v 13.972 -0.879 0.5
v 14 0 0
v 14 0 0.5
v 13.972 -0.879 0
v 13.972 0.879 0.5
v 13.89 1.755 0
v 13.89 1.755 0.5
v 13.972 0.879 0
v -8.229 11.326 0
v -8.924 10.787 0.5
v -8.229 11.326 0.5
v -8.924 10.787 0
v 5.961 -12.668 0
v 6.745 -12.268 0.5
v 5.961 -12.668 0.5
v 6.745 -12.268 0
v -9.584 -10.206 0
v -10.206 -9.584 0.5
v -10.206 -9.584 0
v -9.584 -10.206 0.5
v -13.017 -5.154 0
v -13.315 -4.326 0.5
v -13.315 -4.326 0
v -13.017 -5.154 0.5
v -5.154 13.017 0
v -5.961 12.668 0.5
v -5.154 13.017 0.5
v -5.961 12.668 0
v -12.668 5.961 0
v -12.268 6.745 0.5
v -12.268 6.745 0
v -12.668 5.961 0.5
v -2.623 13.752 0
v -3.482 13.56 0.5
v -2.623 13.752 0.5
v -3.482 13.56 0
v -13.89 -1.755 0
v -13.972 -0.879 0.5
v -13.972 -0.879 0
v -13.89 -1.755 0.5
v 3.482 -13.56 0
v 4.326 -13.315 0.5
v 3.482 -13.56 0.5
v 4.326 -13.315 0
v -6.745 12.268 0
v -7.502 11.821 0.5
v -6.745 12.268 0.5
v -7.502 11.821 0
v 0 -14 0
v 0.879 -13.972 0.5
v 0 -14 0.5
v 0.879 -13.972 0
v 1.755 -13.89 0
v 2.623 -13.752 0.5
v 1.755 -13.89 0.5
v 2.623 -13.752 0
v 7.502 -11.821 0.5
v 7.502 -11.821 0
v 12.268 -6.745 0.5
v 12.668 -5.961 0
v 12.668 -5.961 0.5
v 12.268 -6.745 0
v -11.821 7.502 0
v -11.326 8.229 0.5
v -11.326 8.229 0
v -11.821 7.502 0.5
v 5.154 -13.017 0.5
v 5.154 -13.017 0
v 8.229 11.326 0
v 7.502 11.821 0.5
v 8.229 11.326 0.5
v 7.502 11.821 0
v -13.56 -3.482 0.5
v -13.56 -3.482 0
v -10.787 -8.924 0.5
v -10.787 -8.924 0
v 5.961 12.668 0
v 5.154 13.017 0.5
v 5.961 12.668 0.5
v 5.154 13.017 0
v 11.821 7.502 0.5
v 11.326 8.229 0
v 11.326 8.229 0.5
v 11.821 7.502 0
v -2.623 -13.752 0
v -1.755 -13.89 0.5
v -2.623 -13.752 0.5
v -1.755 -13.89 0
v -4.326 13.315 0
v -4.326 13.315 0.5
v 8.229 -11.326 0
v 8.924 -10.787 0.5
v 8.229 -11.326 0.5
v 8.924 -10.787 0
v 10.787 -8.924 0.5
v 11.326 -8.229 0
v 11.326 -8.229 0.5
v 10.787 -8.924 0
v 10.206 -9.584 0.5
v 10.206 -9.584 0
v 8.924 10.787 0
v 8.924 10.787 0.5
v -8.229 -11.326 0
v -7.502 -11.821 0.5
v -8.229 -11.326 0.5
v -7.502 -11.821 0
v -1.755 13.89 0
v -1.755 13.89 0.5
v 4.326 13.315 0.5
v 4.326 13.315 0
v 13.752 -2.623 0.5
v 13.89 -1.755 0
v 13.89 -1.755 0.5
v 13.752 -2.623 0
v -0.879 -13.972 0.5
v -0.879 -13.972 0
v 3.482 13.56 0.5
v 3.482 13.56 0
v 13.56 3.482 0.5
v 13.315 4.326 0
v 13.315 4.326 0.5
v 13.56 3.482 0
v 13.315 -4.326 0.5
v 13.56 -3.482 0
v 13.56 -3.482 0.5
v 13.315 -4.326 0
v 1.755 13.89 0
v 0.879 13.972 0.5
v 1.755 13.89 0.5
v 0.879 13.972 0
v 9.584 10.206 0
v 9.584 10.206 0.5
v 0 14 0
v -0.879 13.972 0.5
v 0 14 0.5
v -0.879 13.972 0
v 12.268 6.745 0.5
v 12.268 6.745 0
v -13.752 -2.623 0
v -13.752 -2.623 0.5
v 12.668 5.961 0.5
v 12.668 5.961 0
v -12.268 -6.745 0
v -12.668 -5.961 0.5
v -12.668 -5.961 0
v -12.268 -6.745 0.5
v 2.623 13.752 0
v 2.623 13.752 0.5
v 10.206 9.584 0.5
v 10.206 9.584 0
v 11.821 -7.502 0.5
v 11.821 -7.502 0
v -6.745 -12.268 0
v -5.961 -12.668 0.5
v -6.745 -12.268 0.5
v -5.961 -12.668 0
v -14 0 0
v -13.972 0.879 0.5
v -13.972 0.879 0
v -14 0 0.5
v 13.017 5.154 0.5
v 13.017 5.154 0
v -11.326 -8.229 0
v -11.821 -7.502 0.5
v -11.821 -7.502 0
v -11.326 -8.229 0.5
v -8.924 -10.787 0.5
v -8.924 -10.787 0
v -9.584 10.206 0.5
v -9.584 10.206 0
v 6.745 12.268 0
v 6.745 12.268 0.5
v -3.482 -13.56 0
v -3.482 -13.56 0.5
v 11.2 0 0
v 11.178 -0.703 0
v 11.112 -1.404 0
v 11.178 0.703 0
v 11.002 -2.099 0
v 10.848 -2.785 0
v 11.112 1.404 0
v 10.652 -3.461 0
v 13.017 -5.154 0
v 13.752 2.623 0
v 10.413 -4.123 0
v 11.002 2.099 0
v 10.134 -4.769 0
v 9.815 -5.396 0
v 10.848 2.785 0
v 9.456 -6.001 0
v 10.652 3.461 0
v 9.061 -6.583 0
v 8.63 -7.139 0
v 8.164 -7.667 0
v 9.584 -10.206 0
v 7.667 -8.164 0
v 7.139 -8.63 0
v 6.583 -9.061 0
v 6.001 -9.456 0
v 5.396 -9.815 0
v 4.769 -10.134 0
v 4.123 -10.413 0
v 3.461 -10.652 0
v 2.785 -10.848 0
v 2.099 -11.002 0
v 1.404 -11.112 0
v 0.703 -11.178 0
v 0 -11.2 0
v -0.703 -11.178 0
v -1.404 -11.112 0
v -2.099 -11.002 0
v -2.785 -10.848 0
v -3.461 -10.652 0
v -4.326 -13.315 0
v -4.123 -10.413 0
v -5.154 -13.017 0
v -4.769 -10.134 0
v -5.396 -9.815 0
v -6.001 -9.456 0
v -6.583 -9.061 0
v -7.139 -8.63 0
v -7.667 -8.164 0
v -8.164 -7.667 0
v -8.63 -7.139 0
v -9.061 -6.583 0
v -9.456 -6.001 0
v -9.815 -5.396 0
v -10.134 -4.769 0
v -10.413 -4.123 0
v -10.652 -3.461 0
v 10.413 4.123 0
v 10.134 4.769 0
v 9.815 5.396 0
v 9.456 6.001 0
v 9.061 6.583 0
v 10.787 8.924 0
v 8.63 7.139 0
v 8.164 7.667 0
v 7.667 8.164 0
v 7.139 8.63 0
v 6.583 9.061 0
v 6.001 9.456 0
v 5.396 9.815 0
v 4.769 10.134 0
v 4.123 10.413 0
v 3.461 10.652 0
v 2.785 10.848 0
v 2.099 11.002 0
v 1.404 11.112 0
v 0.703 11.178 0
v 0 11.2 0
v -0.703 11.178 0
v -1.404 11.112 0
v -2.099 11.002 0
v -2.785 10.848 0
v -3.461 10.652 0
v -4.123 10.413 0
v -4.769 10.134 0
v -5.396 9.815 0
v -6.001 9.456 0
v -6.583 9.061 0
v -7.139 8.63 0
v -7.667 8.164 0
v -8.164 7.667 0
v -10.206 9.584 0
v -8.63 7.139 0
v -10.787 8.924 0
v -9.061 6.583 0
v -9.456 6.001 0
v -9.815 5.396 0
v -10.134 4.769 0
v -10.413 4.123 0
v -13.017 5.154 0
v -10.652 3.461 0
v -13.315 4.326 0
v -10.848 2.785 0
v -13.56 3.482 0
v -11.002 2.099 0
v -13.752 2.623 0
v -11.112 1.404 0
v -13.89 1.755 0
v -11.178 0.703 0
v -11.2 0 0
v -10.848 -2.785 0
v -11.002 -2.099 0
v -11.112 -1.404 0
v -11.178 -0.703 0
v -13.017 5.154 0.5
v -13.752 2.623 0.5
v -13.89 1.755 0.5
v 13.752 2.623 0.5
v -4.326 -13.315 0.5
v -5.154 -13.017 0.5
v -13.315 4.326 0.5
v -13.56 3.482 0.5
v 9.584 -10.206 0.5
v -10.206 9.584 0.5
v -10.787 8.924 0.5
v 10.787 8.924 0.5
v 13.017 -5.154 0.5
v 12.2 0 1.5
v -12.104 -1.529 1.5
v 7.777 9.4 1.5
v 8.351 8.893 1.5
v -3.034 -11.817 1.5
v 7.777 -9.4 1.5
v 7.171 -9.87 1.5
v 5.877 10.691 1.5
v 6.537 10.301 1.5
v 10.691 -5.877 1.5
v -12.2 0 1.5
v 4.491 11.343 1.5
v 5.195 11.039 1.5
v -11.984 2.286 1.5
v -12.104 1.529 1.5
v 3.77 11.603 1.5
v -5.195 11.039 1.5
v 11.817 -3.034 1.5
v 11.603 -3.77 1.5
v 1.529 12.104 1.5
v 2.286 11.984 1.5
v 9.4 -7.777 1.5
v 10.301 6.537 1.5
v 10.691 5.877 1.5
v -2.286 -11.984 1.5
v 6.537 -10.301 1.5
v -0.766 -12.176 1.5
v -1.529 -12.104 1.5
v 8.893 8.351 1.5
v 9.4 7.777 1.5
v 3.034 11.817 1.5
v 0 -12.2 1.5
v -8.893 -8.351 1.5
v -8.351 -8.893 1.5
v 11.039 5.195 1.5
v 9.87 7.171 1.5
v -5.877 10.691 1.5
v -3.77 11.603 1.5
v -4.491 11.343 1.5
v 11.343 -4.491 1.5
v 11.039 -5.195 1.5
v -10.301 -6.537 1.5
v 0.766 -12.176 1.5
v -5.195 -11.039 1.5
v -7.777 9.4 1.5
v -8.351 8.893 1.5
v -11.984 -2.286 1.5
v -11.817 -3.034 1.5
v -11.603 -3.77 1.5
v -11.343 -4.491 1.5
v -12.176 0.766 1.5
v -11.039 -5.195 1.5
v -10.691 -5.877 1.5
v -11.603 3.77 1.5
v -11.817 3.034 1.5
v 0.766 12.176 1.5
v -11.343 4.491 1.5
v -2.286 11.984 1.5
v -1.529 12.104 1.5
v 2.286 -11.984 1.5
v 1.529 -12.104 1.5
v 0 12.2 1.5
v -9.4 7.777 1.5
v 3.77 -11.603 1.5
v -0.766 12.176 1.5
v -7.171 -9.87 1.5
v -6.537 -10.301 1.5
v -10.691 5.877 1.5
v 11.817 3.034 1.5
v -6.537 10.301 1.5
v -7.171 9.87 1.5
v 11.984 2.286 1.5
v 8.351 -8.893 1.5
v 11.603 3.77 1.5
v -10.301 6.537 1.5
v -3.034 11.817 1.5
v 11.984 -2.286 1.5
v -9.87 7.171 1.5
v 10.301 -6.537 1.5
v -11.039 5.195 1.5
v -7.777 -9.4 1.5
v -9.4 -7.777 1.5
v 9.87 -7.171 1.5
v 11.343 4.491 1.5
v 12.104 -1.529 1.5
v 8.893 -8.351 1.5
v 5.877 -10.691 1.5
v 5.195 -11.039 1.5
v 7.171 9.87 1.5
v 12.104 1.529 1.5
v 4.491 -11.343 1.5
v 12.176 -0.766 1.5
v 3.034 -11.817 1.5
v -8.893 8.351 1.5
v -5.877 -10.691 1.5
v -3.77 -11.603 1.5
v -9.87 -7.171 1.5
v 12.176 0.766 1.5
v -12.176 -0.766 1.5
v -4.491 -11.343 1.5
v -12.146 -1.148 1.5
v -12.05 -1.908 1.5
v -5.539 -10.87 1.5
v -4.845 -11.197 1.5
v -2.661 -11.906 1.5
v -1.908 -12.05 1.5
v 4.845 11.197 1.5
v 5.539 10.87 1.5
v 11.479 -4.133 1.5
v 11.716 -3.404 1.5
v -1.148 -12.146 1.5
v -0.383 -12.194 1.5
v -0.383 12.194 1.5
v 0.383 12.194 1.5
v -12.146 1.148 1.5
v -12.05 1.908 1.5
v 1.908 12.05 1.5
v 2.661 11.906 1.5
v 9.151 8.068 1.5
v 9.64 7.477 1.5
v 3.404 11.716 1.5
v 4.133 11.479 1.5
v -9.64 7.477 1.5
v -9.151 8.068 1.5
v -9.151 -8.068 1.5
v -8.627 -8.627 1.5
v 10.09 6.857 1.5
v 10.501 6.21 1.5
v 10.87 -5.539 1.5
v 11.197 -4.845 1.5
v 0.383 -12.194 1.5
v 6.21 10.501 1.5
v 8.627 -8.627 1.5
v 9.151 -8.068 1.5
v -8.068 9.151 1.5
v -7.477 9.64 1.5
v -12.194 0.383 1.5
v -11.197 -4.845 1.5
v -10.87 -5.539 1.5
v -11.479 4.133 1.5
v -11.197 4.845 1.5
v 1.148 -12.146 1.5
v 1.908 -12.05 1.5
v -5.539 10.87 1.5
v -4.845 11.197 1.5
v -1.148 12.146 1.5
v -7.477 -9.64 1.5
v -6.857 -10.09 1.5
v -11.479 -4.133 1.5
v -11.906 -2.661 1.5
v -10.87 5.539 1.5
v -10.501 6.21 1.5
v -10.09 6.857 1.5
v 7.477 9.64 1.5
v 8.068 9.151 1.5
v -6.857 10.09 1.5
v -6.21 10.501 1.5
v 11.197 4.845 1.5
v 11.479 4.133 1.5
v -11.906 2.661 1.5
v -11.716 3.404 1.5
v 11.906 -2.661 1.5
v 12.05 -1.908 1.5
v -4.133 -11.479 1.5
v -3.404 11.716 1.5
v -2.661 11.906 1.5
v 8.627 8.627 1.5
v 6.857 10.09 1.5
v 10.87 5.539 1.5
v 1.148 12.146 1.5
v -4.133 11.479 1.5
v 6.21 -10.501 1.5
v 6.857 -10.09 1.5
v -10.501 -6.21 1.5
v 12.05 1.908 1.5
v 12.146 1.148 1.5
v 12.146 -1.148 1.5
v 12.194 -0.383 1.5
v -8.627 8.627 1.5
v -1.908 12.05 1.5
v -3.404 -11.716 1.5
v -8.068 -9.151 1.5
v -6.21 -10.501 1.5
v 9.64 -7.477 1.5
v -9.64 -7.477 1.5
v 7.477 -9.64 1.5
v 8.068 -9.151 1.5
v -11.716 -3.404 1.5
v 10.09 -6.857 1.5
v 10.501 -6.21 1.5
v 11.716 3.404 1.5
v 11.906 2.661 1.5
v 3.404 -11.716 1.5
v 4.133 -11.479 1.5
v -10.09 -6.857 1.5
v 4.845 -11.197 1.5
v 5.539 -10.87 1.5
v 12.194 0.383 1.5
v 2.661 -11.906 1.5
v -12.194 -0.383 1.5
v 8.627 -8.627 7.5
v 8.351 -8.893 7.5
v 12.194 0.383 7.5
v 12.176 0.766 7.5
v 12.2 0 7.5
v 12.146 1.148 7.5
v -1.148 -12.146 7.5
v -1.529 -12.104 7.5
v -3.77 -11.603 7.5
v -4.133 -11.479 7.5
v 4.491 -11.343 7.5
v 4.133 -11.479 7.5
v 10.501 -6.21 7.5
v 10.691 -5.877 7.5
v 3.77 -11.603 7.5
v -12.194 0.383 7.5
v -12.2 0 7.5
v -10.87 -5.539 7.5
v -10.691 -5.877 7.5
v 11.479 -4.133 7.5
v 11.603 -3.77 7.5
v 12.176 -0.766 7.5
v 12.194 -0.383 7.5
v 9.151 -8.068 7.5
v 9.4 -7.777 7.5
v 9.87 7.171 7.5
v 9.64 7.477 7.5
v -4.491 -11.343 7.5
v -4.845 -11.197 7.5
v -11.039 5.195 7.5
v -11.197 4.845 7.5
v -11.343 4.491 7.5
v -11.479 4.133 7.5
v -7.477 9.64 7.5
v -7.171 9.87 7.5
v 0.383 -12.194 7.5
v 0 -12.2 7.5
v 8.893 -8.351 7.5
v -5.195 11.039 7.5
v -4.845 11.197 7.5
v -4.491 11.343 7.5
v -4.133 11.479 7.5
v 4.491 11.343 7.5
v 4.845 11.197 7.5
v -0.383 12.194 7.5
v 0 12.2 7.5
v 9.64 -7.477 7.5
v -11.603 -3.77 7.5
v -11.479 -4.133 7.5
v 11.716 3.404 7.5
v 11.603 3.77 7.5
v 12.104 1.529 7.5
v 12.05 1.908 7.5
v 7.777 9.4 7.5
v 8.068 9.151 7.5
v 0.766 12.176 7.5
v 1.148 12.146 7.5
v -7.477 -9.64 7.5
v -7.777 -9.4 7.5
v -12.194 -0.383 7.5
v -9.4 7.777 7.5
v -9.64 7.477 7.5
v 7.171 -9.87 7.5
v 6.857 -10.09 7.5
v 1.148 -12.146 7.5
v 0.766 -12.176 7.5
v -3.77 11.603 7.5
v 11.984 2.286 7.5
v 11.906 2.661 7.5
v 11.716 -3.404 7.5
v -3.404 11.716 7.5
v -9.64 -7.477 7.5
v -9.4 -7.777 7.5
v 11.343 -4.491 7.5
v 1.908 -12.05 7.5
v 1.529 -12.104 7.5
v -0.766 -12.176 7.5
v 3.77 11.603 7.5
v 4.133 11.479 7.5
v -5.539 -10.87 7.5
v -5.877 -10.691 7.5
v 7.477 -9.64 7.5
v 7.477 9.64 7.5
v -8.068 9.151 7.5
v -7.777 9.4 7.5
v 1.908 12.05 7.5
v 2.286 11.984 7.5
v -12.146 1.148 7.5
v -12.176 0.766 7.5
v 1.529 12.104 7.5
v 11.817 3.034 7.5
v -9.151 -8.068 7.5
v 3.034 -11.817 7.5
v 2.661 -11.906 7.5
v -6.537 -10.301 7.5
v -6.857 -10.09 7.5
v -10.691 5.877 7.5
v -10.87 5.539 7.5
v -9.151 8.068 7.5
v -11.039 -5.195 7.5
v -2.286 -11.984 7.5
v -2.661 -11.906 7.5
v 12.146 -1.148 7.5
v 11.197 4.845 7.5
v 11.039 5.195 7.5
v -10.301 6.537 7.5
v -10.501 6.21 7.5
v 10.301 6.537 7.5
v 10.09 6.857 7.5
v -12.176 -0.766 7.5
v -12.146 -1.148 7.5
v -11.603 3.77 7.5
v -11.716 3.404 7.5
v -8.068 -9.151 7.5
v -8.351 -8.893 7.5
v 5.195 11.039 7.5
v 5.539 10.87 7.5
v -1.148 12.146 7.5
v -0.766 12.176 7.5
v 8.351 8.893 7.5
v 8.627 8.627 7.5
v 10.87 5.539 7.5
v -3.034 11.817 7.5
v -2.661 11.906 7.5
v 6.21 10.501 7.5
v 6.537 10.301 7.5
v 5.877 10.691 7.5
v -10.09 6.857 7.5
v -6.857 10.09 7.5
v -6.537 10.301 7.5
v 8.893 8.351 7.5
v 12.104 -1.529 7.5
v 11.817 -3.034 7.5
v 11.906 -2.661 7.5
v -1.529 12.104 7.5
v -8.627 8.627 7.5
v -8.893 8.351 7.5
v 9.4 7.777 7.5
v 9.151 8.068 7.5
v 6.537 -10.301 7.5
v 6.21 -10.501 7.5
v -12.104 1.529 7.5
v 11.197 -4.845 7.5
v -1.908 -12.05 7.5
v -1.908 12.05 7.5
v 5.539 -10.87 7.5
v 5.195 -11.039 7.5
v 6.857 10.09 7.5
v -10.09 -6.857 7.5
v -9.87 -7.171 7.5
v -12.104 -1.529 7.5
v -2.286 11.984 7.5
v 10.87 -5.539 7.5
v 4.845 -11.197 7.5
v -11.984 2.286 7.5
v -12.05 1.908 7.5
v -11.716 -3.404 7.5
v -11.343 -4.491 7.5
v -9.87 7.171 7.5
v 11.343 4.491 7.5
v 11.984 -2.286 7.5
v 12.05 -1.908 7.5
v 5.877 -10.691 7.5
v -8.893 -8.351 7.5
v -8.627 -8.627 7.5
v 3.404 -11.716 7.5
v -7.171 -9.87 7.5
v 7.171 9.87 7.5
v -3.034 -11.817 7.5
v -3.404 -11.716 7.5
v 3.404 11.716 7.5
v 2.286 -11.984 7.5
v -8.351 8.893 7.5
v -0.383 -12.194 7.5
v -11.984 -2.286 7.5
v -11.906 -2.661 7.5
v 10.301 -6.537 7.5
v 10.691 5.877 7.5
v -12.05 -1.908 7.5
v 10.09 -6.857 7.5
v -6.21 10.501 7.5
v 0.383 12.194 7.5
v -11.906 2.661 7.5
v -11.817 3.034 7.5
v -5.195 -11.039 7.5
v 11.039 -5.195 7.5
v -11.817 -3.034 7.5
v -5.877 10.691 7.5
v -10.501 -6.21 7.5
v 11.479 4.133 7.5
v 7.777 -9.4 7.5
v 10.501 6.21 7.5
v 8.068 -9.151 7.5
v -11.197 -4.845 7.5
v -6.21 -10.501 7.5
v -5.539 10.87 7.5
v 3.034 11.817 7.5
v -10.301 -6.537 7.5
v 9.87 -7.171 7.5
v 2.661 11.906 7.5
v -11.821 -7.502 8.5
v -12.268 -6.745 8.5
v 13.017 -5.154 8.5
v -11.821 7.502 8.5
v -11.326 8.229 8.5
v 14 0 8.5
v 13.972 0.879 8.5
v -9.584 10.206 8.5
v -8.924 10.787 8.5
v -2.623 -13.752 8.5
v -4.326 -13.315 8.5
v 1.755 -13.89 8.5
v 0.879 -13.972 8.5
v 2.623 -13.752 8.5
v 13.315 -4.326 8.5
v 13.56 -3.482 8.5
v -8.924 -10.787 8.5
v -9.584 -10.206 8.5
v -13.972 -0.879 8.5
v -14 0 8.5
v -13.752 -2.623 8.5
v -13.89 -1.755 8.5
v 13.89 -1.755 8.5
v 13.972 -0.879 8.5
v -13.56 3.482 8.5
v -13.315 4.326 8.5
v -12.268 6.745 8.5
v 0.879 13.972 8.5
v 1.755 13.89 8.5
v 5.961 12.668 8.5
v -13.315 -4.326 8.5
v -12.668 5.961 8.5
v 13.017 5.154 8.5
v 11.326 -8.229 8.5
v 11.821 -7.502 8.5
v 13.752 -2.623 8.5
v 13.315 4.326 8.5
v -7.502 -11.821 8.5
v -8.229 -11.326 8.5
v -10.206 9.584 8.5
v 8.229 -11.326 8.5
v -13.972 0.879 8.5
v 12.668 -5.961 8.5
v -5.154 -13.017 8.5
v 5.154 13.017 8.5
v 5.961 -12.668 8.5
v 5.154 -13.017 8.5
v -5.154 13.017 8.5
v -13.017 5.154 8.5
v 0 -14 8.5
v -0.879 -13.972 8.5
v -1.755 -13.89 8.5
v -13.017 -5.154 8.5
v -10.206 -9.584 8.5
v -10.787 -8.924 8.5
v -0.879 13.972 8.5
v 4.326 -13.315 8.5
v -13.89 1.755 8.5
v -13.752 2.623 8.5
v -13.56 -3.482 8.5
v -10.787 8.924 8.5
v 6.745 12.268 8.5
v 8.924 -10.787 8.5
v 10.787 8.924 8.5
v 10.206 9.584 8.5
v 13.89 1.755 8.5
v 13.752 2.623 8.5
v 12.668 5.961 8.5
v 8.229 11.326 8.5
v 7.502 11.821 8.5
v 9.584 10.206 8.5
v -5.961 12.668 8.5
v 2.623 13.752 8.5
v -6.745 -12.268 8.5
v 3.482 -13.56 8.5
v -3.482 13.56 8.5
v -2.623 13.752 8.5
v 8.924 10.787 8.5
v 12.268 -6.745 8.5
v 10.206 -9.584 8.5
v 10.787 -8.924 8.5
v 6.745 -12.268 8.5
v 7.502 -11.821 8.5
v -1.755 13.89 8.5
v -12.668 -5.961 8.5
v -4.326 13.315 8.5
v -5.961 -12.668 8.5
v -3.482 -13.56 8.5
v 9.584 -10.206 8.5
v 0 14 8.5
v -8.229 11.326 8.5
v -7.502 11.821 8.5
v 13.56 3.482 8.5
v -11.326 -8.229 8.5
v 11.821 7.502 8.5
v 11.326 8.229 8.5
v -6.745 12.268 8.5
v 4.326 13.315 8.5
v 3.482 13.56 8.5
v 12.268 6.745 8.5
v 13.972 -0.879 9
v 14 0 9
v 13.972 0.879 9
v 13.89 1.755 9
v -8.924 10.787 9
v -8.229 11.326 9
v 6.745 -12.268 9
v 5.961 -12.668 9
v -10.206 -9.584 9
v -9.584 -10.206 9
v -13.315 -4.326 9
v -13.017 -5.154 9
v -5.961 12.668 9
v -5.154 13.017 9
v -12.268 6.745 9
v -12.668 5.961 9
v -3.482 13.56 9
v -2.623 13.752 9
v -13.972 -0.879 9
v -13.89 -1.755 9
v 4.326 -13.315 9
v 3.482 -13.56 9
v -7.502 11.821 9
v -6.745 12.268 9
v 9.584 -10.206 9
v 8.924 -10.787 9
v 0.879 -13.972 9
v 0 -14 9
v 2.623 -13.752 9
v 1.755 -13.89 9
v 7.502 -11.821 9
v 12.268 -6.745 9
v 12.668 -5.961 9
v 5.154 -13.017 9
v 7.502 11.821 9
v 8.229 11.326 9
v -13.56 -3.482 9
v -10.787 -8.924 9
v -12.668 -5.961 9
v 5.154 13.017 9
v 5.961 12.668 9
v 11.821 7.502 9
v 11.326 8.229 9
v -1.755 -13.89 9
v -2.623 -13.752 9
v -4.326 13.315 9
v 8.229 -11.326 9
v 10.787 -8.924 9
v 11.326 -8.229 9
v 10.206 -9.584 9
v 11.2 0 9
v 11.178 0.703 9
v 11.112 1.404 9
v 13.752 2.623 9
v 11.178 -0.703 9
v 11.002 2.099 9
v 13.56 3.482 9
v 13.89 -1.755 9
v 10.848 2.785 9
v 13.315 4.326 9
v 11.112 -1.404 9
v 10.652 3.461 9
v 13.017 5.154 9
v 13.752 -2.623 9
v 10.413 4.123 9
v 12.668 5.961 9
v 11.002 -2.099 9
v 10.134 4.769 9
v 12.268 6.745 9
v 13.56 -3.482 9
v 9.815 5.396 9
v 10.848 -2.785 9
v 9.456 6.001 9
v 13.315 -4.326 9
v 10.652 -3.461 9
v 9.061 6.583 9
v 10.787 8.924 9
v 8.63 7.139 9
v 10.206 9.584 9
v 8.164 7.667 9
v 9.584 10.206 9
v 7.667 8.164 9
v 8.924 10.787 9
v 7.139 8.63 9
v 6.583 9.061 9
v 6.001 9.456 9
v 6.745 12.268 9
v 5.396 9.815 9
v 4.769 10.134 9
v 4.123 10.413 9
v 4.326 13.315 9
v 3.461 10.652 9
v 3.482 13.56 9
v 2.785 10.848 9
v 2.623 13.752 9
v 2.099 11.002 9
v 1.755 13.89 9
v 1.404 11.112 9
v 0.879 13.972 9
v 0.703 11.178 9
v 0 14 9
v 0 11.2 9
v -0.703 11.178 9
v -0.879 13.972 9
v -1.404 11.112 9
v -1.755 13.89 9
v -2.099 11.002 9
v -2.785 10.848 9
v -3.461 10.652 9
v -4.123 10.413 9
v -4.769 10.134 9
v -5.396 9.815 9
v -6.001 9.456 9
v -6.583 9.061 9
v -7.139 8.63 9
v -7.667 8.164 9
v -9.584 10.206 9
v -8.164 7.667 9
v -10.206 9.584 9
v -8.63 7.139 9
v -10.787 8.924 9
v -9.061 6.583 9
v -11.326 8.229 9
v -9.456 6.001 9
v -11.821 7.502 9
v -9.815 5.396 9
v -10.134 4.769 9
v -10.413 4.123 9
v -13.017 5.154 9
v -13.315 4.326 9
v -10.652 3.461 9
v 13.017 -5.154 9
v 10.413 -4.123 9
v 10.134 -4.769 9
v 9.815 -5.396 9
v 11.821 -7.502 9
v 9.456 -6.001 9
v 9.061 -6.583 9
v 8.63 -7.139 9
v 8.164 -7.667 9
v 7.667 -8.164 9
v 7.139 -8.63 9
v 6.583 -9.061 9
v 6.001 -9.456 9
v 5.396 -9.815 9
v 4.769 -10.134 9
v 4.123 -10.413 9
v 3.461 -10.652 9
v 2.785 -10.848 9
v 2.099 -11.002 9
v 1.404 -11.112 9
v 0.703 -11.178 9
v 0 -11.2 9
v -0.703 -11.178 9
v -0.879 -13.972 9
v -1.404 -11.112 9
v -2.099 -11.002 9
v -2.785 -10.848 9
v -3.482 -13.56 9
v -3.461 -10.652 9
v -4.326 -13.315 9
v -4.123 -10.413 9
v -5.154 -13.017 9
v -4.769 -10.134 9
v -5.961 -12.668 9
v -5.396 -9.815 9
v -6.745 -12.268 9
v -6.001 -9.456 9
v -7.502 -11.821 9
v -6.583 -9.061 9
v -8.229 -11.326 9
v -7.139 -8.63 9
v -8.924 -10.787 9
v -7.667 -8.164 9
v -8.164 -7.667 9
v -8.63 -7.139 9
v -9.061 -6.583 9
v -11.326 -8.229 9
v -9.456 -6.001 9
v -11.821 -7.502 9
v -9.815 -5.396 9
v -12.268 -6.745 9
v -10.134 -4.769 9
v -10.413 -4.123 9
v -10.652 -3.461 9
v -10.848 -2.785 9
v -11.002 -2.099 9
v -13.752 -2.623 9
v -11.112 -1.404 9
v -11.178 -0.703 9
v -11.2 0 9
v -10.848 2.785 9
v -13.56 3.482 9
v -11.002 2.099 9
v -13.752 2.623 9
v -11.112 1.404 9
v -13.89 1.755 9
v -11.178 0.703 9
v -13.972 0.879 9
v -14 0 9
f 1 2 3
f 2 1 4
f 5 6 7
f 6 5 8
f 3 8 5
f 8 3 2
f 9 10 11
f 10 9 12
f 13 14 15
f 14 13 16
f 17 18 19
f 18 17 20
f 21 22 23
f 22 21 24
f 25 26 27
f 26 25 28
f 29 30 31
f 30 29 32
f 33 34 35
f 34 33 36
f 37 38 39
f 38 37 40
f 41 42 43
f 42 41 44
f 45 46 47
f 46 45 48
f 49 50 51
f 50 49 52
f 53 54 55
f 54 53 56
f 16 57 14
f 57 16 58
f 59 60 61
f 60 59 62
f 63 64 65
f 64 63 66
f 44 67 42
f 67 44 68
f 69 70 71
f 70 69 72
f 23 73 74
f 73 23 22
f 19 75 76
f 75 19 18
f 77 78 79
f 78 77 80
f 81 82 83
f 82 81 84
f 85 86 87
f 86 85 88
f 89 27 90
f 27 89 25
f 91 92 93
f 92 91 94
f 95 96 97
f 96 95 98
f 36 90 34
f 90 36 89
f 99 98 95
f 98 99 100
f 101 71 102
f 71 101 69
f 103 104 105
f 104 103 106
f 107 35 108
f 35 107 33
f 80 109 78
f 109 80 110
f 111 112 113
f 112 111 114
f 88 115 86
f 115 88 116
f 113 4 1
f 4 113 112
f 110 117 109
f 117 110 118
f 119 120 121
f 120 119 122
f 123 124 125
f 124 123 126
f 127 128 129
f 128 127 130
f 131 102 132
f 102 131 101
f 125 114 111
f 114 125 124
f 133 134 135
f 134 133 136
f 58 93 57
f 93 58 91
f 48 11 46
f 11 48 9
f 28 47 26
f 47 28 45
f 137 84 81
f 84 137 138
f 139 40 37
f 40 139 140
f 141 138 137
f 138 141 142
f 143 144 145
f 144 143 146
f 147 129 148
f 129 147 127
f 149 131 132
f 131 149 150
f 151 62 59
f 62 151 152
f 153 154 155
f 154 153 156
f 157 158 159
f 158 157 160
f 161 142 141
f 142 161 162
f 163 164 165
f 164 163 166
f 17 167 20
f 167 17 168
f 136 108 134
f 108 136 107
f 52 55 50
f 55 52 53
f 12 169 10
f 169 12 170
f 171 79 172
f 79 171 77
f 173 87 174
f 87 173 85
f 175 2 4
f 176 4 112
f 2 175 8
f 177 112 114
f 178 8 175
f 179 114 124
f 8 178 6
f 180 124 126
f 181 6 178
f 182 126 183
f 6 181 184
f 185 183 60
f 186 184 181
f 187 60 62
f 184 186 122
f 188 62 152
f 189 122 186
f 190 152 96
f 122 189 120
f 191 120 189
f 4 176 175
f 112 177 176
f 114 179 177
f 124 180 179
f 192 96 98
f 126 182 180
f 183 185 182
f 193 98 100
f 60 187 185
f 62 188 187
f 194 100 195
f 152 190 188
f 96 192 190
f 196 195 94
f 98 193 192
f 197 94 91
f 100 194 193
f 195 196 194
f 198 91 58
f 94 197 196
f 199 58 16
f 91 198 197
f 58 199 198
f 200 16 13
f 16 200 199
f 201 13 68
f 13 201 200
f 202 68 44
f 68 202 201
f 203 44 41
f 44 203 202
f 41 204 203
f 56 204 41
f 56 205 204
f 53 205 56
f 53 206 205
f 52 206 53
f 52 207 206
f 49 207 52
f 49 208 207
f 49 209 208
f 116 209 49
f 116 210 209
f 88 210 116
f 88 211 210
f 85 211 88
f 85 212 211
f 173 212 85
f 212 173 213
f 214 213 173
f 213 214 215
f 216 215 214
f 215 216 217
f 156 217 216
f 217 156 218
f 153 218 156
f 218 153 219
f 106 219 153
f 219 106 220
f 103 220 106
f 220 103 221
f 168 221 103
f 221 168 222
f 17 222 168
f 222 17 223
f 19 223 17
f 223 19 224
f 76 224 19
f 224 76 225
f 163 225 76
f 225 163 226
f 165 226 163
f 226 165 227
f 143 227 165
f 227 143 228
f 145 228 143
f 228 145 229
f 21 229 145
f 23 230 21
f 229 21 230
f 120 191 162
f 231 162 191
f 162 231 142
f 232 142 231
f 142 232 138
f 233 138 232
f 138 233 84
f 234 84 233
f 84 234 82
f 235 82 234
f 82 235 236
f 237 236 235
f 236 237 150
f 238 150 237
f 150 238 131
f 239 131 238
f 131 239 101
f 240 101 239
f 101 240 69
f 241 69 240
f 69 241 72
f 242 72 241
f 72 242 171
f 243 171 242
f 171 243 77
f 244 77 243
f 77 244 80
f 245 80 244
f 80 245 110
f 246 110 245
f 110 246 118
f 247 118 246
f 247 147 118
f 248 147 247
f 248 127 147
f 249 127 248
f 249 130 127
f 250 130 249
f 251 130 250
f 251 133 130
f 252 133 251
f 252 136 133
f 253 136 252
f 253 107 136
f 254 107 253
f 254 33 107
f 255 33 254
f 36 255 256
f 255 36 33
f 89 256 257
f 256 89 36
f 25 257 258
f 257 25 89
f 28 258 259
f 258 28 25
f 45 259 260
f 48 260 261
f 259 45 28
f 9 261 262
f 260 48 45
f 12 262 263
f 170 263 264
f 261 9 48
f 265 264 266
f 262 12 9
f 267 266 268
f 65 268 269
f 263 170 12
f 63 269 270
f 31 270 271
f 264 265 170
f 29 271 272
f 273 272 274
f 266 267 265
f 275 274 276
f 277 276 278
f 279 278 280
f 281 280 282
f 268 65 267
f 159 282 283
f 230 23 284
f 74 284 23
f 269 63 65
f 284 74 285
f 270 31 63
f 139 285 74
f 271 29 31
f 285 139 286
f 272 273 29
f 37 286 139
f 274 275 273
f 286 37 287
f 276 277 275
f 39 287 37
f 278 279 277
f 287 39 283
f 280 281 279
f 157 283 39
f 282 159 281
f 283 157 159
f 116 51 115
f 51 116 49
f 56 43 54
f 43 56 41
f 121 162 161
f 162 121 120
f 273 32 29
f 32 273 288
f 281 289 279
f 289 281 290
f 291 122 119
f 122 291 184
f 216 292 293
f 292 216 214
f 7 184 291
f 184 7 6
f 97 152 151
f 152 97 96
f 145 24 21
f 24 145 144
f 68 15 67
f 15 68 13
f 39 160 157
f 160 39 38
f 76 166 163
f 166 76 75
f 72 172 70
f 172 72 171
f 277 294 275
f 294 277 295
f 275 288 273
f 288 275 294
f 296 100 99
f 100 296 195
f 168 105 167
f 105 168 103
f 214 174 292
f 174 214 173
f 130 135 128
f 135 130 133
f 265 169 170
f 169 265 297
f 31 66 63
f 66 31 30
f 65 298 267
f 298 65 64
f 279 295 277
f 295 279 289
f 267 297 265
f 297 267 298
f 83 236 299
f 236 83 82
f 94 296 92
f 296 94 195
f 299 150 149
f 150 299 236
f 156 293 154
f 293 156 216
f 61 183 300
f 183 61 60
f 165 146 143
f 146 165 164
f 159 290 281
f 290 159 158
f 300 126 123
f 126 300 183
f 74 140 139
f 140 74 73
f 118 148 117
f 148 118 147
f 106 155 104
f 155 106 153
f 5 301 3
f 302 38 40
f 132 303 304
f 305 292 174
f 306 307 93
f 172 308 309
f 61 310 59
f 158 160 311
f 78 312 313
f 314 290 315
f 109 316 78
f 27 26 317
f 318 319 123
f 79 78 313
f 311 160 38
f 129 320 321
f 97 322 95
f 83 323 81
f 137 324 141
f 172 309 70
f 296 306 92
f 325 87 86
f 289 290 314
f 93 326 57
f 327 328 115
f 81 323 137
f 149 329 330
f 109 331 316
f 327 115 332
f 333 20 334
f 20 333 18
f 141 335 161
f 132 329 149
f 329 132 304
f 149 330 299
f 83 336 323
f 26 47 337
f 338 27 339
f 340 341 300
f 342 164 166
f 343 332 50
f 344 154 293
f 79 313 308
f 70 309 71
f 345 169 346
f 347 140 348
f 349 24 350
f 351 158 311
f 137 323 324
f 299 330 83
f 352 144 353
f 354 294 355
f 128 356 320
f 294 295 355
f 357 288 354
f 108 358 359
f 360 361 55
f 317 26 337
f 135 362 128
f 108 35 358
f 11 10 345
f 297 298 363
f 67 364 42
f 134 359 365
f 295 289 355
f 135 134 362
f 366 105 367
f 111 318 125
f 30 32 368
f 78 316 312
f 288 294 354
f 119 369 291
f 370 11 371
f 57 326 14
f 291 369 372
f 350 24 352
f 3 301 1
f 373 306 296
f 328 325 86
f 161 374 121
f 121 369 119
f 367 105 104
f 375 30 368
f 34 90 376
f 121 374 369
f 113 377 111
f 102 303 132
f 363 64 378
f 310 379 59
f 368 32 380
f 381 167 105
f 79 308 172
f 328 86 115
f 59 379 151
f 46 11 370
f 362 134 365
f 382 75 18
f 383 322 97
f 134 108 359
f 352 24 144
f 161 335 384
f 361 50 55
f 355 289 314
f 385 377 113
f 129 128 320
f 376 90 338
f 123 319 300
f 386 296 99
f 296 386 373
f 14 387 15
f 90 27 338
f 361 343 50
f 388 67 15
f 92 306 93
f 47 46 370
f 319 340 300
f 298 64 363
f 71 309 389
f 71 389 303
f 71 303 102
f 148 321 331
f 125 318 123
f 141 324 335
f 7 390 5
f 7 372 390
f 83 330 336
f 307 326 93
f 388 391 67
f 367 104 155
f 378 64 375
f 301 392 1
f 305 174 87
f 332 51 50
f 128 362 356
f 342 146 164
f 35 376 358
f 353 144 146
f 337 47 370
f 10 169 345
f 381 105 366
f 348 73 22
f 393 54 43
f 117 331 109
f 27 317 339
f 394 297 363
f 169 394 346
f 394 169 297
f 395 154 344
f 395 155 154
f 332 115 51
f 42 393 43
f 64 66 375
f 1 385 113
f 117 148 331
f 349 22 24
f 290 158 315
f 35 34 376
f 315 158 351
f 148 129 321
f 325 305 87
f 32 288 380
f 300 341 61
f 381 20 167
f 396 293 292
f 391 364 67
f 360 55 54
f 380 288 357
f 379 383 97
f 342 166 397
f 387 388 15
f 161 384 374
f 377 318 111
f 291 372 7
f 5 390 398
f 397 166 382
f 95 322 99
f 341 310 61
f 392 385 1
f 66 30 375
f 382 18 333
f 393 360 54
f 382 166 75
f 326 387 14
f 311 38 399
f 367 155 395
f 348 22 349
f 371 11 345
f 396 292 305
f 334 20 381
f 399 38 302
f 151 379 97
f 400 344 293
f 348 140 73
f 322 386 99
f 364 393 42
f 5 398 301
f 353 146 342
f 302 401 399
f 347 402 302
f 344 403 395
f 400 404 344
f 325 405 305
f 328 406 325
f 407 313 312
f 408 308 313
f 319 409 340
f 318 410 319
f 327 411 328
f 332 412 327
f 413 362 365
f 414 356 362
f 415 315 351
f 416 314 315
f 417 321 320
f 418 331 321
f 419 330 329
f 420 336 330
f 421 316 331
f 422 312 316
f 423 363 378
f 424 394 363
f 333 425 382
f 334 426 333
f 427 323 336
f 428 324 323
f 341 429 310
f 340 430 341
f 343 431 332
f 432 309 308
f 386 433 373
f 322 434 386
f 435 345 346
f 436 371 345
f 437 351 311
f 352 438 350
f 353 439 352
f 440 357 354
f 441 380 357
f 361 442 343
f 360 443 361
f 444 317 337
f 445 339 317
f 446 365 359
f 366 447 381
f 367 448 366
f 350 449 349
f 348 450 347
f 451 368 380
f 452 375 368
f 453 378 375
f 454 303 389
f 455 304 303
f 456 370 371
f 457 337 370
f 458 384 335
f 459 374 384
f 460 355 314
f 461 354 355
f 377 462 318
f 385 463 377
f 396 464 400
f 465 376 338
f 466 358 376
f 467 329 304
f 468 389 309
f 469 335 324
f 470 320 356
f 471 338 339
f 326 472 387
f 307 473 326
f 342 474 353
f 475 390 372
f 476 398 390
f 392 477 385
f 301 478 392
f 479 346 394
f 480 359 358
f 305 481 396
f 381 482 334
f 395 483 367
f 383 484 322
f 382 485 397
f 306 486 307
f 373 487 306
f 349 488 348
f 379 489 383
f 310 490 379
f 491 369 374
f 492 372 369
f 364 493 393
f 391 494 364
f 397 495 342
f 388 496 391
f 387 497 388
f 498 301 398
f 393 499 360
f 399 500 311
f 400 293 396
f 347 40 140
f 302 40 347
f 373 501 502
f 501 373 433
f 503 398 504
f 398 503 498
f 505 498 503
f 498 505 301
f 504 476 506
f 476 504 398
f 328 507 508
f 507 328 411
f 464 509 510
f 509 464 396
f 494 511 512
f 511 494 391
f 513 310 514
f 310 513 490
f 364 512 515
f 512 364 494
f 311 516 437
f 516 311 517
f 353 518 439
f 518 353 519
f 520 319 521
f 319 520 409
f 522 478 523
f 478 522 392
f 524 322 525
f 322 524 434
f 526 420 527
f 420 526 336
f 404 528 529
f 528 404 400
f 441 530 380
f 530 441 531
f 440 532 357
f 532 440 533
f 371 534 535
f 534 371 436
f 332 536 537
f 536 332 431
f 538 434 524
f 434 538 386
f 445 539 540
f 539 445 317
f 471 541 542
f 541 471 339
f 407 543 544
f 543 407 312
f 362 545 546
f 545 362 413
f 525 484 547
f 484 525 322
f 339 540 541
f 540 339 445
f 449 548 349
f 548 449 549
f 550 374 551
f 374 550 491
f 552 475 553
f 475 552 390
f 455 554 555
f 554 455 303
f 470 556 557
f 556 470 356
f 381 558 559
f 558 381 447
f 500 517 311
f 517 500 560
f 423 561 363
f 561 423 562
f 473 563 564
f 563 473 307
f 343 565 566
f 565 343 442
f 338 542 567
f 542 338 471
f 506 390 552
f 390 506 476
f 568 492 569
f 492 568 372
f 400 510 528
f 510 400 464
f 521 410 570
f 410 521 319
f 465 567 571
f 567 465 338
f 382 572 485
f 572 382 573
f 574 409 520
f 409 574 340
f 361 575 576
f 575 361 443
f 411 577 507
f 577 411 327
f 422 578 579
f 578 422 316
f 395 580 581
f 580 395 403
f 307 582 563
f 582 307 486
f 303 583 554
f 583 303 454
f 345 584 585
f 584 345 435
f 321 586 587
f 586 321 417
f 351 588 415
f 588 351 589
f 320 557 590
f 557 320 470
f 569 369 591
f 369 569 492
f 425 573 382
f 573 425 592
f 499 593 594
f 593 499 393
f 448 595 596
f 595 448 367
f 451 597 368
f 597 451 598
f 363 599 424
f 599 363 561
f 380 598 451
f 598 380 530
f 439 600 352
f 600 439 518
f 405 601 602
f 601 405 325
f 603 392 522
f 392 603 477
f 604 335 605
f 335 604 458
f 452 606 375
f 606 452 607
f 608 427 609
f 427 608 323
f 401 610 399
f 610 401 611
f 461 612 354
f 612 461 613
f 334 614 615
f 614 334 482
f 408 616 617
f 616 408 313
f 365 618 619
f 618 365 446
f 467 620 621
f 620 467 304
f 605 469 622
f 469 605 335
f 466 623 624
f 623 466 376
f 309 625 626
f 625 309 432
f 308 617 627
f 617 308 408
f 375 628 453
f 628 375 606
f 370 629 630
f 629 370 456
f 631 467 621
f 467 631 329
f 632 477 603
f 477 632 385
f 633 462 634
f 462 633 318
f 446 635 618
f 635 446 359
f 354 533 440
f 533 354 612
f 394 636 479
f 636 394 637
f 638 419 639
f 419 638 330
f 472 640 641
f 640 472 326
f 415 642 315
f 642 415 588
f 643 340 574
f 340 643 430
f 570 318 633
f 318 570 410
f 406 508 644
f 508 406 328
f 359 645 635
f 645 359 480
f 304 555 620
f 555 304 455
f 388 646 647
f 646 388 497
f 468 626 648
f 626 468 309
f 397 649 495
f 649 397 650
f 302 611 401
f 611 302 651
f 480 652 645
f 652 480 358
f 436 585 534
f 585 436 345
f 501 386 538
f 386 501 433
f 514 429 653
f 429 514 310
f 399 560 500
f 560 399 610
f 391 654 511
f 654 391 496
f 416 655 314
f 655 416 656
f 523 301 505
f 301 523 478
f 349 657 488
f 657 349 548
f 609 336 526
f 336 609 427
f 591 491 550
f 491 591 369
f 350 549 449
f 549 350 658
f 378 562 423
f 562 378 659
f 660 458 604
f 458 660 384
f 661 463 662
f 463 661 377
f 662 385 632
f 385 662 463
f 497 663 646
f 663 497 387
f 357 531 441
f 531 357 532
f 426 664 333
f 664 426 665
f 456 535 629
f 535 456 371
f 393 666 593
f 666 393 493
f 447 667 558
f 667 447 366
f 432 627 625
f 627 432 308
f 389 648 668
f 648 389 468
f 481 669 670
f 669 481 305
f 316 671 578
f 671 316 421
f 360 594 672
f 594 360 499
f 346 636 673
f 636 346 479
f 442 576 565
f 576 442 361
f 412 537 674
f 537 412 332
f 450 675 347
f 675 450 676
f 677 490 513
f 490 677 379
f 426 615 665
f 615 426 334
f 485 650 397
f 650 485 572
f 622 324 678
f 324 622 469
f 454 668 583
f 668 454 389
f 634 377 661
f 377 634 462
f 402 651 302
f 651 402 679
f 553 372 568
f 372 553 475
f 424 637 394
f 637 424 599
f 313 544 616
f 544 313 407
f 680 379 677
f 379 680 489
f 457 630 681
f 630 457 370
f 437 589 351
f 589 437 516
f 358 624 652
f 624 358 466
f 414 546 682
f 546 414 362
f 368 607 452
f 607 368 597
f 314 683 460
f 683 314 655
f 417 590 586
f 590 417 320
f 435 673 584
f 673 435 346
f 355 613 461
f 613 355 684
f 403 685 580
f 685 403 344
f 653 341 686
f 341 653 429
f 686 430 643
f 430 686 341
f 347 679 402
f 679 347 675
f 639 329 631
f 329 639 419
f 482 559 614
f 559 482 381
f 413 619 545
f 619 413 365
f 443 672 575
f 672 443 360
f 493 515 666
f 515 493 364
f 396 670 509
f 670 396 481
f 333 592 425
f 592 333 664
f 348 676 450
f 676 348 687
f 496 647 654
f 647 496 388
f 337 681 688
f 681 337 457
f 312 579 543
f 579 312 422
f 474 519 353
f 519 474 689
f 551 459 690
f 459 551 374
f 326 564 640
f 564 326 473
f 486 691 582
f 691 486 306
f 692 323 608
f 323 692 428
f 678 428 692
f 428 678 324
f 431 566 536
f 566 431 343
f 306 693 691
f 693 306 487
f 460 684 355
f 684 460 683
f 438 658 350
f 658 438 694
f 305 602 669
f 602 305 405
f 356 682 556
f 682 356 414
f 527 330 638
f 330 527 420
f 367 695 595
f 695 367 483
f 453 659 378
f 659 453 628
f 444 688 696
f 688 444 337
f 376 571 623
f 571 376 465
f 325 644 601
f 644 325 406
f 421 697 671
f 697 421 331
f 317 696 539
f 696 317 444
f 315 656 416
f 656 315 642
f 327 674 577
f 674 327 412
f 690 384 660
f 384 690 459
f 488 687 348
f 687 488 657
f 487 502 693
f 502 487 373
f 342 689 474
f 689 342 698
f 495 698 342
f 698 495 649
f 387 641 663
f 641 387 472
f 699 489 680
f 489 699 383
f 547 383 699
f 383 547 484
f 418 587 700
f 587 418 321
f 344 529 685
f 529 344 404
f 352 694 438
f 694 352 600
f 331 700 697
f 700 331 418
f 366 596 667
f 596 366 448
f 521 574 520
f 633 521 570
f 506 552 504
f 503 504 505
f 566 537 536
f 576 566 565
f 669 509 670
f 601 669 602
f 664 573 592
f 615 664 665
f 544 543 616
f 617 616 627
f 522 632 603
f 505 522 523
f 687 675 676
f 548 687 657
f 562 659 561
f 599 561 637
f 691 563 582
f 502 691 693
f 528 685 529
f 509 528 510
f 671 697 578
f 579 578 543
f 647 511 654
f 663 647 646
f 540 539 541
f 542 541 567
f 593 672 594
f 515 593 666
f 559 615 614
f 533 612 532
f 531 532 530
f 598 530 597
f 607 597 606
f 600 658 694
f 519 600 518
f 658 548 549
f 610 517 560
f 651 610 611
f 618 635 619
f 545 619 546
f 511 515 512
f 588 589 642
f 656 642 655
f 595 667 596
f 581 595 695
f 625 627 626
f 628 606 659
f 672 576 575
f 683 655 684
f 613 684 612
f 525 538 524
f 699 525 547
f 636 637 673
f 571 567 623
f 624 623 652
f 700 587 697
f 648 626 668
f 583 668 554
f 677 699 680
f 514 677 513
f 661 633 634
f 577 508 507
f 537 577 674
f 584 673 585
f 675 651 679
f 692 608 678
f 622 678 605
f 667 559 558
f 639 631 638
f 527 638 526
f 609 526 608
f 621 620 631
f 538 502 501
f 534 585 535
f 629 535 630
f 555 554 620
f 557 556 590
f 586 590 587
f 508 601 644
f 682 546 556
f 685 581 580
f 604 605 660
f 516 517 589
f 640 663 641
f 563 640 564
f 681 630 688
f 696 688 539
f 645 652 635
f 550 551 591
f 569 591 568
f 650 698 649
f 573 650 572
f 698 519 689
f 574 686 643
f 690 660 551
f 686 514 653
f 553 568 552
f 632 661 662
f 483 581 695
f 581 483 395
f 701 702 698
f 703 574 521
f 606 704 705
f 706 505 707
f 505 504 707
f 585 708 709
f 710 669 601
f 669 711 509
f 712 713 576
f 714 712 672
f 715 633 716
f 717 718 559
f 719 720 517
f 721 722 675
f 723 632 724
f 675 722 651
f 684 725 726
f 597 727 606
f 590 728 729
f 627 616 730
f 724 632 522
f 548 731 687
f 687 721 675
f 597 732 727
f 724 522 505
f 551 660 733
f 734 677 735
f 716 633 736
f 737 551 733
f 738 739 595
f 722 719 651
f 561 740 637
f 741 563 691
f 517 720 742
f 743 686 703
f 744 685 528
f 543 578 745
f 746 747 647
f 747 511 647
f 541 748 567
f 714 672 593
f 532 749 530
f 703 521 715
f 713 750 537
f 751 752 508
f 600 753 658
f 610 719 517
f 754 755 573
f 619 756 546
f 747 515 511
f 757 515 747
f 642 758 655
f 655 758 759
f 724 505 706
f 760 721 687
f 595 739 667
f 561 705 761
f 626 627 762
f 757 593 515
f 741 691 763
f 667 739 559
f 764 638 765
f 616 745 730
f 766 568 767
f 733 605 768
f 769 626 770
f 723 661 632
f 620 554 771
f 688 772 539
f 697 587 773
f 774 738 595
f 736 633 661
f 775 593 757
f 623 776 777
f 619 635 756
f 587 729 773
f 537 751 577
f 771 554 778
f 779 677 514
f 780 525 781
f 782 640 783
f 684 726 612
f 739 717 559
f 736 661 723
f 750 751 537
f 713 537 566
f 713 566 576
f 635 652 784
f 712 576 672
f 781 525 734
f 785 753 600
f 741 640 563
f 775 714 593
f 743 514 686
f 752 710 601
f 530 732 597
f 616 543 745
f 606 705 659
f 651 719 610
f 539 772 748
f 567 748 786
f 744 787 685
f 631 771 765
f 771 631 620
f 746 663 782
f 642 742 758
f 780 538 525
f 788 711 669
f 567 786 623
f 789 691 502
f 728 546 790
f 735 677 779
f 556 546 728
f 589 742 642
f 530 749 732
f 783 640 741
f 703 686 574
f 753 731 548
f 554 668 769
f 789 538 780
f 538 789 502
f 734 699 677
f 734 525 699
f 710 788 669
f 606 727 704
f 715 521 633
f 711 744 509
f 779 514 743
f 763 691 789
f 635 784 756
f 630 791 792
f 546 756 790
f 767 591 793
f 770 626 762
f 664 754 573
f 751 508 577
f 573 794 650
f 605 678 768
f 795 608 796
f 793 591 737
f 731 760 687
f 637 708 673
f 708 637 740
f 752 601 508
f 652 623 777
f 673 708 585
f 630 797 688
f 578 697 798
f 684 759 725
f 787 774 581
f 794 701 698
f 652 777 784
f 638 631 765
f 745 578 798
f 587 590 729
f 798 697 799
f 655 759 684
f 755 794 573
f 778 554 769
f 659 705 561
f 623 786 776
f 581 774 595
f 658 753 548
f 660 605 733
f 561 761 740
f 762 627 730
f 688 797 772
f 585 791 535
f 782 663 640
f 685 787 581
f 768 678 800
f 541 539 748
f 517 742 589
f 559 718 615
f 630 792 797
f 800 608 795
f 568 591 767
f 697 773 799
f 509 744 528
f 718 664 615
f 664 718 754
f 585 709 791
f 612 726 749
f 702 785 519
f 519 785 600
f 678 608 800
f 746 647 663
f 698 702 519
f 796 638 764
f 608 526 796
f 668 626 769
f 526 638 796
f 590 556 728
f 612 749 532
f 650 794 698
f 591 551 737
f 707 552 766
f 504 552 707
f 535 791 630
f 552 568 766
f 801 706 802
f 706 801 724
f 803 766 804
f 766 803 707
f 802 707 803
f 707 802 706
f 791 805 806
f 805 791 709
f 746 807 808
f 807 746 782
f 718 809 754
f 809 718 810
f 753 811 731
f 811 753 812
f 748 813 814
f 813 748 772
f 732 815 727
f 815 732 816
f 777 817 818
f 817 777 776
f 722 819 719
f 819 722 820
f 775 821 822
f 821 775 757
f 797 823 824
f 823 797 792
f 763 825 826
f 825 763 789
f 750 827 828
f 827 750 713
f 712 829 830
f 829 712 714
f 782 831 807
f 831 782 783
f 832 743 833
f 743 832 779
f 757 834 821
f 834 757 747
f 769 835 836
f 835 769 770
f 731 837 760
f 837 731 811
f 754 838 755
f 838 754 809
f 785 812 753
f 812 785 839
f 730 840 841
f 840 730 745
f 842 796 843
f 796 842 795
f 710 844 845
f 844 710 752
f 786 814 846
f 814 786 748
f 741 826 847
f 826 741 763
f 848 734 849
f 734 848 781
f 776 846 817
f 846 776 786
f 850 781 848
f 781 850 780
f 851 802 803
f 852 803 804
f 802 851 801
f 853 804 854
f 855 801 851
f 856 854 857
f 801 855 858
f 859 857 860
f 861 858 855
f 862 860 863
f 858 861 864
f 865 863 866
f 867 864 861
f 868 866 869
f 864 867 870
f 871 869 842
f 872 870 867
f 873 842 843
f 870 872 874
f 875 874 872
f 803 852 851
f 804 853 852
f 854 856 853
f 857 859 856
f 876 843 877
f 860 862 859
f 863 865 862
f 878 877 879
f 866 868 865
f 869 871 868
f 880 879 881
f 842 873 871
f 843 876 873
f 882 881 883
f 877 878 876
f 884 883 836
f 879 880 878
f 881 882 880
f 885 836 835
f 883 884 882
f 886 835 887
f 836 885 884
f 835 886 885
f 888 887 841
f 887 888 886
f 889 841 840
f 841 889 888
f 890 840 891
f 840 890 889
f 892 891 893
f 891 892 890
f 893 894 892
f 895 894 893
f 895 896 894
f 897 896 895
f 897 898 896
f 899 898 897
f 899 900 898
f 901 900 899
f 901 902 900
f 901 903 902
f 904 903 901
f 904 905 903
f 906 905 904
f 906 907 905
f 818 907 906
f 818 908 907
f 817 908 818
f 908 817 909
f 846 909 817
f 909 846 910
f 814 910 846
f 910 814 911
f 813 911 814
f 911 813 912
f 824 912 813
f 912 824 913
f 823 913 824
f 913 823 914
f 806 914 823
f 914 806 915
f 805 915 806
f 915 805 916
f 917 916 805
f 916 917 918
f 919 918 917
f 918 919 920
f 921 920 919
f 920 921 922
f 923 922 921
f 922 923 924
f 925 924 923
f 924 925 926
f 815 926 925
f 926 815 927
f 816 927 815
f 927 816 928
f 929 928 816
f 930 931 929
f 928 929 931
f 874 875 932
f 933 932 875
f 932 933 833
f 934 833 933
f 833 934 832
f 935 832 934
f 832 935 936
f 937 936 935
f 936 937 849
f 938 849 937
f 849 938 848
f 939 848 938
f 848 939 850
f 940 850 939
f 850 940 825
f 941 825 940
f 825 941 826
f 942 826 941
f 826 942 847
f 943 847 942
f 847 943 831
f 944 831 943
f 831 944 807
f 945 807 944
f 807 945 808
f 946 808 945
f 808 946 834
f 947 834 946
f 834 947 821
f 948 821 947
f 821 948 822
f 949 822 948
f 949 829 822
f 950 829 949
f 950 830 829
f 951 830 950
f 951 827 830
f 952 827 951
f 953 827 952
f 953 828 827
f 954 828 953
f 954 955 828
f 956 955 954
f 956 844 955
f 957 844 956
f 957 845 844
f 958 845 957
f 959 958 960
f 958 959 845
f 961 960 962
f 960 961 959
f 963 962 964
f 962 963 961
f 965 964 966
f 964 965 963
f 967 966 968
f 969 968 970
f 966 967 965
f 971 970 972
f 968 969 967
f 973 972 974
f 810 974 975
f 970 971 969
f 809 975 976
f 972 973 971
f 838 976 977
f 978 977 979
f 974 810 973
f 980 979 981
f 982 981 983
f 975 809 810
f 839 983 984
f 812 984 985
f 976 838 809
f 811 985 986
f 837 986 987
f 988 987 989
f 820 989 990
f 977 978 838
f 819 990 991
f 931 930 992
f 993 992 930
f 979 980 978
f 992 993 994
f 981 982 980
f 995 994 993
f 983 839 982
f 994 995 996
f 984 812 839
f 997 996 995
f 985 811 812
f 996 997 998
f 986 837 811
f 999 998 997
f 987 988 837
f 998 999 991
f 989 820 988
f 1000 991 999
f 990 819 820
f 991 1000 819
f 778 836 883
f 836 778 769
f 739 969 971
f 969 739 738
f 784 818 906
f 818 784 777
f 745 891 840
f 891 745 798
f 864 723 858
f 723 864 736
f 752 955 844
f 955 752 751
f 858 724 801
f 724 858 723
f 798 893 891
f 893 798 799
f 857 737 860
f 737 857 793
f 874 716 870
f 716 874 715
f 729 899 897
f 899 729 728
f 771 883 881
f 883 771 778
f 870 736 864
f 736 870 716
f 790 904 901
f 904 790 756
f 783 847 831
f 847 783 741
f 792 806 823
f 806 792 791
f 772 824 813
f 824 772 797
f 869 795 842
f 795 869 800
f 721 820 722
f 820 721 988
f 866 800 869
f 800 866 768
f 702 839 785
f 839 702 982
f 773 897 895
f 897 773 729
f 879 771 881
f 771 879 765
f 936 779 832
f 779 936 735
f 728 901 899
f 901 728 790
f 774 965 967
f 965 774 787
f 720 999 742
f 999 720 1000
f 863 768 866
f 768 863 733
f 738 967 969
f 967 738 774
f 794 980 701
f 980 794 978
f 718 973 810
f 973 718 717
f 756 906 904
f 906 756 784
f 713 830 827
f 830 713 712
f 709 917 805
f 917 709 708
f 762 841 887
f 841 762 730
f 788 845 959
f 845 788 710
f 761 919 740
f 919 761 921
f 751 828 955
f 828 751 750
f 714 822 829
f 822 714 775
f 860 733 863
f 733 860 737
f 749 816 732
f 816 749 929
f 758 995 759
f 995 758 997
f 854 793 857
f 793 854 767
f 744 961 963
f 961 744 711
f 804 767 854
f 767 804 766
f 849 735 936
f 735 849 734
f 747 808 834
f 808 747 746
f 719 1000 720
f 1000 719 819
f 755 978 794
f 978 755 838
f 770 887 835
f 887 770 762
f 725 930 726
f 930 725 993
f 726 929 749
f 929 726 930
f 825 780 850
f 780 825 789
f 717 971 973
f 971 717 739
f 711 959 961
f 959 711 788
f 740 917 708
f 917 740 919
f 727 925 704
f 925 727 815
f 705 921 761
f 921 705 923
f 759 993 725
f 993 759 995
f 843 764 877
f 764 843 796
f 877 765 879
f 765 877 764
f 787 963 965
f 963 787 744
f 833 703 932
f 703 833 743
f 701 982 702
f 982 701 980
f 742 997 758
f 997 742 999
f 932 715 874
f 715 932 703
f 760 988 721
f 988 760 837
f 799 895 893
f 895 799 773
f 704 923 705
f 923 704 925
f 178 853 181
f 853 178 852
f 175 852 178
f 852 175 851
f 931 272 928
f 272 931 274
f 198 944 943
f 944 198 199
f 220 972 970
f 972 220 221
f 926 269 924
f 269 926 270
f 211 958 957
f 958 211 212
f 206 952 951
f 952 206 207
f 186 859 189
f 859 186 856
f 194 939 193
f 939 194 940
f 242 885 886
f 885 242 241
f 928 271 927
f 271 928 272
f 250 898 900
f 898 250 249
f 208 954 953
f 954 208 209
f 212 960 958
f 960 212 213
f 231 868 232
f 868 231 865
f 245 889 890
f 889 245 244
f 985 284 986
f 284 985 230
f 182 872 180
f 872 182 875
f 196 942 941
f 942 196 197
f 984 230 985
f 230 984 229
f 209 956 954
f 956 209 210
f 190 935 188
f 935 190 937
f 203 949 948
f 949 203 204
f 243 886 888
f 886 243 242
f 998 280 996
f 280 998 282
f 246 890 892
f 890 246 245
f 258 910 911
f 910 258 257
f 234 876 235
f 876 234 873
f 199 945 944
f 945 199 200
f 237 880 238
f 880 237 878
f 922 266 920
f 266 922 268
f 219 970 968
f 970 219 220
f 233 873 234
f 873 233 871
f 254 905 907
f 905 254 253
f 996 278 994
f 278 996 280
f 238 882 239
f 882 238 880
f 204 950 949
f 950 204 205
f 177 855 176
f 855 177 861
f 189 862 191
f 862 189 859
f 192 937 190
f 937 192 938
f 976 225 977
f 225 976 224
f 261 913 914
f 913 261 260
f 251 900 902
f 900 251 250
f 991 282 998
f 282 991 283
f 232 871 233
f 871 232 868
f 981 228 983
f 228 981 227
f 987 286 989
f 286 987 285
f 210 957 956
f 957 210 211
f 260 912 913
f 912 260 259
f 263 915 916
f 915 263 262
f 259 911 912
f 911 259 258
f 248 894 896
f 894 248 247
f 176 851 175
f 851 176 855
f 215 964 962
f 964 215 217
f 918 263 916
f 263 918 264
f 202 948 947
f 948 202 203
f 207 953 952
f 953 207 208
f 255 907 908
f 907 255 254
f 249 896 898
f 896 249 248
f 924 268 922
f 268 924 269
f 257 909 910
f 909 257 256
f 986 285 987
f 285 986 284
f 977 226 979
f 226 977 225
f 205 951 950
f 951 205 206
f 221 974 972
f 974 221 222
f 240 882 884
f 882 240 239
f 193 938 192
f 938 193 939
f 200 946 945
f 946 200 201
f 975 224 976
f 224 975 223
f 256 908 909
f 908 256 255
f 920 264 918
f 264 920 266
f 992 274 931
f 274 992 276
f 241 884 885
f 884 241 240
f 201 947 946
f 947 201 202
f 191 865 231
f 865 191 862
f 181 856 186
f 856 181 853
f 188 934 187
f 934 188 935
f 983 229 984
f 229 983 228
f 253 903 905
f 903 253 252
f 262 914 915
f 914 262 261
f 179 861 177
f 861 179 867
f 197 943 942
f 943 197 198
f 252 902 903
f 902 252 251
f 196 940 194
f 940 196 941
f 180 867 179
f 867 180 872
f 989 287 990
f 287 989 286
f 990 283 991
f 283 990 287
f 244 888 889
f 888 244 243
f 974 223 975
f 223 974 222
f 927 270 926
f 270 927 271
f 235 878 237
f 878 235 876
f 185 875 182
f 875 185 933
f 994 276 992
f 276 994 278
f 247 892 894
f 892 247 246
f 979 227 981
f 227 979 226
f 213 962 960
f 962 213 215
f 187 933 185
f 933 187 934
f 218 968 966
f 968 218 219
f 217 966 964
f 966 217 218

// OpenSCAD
d1=22.4;
ep=1;
d_fla=28;
h_courroie=6;
h_fla=1;
h_pla=0.5;

module poulie(){
	difference(){
		union(){
			cylinder(h = h_pla, r = d_fla/2, $fn=100);
			translate([0,0,h_pla]){cylinder(h = h_fla, r1 = d_fla/2, r2=d1/2+ep, $fn=100);}

			translate([0,0,h_fla+h_pla]){cylinder(h = h_courroie, r = d1/2+ep, $fn=200);}
	
			translate([0,0,h_fla+h_pla+h_courroie]){cylinder(h = h_fla, r1=d1/2+ep, r2 = d_fla/2, $fn=100);}
			translate([0,0,h_fla*2+h_pla+h_courroie]){cylinder(h = h_pla, r = d_fla/2, $fn=100);}
		}

		translate([0,0,-5]){cylinder(h = h_courroie+15, r = d1/2, $fn=100);}
	}
}
poulie();
